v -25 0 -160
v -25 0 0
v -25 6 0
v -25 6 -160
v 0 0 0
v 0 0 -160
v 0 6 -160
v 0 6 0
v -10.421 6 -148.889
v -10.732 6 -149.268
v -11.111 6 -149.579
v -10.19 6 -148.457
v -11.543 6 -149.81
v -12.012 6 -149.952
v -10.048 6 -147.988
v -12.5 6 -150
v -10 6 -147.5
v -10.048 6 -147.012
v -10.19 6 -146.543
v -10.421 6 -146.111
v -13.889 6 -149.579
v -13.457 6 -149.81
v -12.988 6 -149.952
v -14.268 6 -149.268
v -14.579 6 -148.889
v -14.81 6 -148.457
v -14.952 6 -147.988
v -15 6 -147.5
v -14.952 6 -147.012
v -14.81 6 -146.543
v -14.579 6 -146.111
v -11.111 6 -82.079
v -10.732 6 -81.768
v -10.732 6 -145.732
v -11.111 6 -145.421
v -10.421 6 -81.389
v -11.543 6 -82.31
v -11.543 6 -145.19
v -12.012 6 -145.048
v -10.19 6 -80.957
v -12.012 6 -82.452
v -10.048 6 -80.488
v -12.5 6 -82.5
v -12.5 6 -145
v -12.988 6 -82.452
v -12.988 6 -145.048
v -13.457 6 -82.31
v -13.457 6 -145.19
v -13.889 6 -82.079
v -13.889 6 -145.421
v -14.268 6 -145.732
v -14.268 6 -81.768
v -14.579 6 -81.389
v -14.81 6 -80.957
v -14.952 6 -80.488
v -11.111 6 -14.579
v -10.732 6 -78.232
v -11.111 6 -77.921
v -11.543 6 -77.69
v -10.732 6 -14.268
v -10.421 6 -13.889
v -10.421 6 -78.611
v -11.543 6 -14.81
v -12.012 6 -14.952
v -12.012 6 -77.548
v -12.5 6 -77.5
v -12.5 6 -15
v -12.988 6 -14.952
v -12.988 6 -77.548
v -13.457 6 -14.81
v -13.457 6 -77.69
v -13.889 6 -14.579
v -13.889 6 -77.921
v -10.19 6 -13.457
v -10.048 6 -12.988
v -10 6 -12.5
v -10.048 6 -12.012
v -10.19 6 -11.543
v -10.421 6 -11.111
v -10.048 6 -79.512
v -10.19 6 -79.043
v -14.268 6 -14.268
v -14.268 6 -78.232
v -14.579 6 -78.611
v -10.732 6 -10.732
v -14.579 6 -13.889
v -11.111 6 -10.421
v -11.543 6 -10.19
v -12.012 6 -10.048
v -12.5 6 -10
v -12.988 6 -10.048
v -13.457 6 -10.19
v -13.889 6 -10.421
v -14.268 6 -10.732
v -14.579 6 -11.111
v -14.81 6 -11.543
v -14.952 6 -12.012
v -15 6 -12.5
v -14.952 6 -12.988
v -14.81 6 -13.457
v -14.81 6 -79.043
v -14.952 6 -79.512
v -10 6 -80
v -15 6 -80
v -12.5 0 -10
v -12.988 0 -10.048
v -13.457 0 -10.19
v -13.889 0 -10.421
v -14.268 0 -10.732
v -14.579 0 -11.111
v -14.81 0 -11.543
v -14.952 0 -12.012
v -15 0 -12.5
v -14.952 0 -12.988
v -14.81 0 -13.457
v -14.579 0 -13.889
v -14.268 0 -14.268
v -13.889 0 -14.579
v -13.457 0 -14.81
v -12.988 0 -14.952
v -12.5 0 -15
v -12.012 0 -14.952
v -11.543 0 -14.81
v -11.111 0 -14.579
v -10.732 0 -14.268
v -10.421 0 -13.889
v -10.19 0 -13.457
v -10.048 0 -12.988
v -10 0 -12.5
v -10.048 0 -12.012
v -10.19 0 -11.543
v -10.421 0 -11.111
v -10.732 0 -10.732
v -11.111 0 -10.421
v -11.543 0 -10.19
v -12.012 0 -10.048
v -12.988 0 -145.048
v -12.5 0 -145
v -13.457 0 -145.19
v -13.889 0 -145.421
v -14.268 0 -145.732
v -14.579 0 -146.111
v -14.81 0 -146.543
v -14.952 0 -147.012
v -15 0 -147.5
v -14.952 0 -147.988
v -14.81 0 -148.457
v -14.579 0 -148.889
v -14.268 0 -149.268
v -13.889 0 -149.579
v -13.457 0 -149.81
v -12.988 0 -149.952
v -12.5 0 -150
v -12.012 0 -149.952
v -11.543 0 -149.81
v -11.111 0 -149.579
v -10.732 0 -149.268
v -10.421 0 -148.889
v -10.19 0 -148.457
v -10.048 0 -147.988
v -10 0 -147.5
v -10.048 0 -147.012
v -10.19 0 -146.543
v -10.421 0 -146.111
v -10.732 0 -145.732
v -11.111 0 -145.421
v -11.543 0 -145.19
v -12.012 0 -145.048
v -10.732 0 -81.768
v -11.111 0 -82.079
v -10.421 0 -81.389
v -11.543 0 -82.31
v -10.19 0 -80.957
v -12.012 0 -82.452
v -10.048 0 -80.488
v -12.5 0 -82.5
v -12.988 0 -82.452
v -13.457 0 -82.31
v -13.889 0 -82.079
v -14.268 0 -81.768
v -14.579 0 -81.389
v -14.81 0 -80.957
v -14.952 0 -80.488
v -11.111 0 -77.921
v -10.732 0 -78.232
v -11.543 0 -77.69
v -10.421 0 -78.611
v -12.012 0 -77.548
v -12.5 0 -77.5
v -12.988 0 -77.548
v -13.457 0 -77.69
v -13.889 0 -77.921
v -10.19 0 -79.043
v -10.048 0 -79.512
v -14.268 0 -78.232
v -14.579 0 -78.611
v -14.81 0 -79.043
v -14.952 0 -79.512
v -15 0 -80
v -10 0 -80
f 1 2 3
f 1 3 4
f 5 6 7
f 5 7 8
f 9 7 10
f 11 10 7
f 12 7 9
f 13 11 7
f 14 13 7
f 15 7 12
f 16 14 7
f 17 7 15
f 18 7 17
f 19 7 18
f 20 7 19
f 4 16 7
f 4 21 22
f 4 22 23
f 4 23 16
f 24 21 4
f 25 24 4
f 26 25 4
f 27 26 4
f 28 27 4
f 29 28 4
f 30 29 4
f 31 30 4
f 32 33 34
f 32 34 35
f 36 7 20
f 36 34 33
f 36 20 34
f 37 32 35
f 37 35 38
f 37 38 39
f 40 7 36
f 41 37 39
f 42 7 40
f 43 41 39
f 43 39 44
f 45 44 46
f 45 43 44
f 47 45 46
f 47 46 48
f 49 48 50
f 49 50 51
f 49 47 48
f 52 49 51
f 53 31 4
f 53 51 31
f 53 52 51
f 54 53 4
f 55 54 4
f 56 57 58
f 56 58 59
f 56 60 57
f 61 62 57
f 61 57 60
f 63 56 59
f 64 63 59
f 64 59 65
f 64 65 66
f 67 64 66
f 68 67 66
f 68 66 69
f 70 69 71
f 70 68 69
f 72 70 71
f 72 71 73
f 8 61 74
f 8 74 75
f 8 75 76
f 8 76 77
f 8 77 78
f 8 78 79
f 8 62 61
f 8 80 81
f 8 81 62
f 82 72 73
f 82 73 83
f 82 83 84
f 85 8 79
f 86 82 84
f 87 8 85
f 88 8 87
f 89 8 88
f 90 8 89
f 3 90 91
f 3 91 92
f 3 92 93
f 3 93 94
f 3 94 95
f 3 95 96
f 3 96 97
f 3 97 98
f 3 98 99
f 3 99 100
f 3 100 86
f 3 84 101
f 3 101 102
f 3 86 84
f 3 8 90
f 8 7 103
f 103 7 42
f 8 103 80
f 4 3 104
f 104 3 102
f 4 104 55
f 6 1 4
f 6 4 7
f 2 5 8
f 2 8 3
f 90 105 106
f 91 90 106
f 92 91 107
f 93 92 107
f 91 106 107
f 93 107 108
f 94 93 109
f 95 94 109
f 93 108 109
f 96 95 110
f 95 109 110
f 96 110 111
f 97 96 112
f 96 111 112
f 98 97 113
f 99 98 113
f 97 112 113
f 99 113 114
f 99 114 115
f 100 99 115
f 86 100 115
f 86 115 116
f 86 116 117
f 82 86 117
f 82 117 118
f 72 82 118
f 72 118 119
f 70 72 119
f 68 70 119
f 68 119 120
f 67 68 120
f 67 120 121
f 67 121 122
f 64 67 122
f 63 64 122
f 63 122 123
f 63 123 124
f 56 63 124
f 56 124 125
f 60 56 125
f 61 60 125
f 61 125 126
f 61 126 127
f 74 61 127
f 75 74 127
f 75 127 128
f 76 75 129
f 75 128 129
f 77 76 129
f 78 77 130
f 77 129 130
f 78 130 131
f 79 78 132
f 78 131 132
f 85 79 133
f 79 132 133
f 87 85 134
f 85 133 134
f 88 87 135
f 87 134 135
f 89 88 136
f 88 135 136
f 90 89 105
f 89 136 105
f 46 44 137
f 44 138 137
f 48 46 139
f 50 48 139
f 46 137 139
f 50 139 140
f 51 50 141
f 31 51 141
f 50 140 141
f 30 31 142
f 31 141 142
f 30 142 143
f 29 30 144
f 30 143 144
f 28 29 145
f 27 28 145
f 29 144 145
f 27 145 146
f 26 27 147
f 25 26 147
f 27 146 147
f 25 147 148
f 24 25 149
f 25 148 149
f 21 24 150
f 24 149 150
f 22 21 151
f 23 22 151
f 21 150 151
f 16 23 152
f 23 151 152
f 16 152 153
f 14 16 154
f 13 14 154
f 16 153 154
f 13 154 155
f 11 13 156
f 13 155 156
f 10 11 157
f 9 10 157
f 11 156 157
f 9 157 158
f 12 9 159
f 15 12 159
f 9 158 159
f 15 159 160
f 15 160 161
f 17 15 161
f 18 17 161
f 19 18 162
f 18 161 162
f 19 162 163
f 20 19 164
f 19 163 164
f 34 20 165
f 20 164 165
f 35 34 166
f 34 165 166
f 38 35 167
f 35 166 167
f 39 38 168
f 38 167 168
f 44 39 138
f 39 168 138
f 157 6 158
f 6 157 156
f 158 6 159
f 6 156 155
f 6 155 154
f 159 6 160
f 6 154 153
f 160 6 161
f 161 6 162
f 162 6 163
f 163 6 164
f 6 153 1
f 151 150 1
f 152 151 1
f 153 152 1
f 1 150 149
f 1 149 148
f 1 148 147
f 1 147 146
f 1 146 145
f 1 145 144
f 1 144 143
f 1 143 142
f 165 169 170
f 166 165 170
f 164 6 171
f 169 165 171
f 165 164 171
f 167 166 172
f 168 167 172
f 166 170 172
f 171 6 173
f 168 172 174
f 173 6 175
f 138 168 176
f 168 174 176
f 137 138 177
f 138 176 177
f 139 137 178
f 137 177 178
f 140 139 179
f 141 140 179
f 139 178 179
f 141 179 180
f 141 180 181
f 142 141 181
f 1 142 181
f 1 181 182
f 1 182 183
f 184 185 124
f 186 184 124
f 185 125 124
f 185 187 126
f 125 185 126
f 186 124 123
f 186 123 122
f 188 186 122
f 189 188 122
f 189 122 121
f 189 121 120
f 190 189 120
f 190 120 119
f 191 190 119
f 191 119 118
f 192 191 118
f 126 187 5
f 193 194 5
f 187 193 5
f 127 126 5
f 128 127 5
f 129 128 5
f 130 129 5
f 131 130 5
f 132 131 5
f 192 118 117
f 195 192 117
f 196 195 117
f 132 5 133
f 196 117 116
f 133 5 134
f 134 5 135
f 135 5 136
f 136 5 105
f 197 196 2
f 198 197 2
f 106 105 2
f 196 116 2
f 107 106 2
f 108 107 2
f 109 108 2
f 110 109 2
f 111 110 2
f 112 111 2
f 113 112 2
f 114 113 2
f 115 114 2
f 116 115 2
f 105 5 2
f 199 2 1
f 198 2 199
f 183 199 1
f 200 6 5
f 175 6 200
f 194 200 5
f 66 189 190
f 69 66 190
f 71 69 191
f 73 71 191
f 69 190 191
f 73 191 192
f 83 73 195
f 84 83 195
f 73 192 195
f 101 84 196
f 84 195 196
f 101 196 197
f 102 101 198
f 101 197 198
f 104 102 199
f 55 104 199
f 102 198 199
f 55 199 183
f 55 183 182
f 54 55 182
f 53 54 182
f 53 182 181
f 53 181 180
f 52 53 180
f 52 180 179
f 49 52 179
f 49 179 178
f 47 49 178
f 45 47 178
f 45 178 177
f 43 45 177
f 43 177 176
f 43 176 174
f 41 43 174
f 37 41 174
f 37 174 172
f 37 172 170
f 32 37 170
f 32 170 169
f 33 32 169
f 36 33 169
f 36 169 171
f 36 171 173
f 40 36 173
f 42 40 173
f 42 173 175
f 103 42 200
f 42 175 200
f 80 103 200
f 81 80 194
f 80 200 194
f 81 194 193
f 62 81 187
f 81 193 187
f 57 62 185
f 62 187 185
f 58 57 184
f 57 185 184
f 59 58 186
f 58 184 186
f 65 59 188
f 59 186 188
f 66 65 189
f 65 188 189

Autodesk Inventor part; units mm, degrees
ref_plane "YZ Plane" through (0, 0, 0) normal (1, 0, 0) x (0, 1, 0)
ref_plane "XZ Plane" through (0, 0, 0) normal (0, 1, 0) x (-1, 0, 0)
ref_plane "XY Plane" through (0, 0, 0) normal (0, 0, 1) x (1, 0, 0)
sketch "Sketch1" plane through (0, 0, 0) normal (0, 1, 0) x (-1, 0, 0)
  line L0 (0, 0) -> (25, 0)
  line L1 (25, 0) -> (25, -160)
  line L2 (25, -160) -> (0, -160)
  line L3 (0, -160) -> (0, 0)
  dimension "d0" = 25
  dimension "d1" = 160
extrude "Extrusion1" add sketch "Sketch1" along normal blind 6
sketch "Sketch2" plane through (0, 6, 0) normal (0, 1, 0) x (1, 0, 0)
  line L0 (-25, 160) -> (-25, 0) projected
  line L1 (-25, 0) -> (0, 0) projected
  line L2 (0, 160) -> (-25, 160) projected
  point P0 (-12.5, 12.5)
  point P1 (-12.5, 147.5)
  dimension "d4" = 25
  dimension "d5" = 160
  dimension "d6" = 12.5
  dimension "d7" = 12.5
  dimension "d8" = 12.5
  dimension "d9" = 12.5
hole "Hole1" at (-12.5, 6, -12.5) at (-12.5, 6, -147.5) direction (0, -1, 0) diameter 5 end through all
sketch "Esboço3" plane through (0, 6, 0) normal (0, 1, 0) x (1, 0, 0)
  line L0 (0, 160) -> (-25, 160) projected
  line L1 (0, 0) -> (0, 160) projected
  line L2 (-25, 160) -> (-25, 0) projected
  line L3 (-25, 0) -> (0, 0) projected
  point P0 (-12.5, 80)
  point P1 (-12.5, 0)
  dimension "d17" = 160
  dimension "d18" = 25
  dimension "d19" = 12.5
  dimension "d20" = 80
hole "Furo2" at (-12.5, 6, -80) direction (0, -1, 0) diameter 5 depth 6
thread "Rosca1" size "M5x0.8" class "6H" standard "ISO Metric profile" length 43.6
thread "Rosca2" size "M5x0.8" class "6H" standard "ISO Metric profile" length 15
equation "\"d6\" = 0.5 * d4"
equation "\"d7\" = d6"
equation "\"d9\" = d8"
equation "\"d15\" = Thickness"
equation "\"d19\" = 0.5 * d18"
equation "\"d20\" = 0.5 * d17"
equation "\"d26\" = Thickness"
equation "\"BendRadius\" = Thickness"
equation "\"BendReliefWidth\" = Thickness"
equation "\"BendReliefDepth\" = 0.5 * Thickness"
equation "\"CornerReliefSize\" = 4 * Thickness"
equation "\"MinimumRemnant\" = 2 * Thickness"
equation "\"TransitionRadius\" = BendRadius"
equation "\"JacobiRadiusSize\" = BendRadius"
equation "\"GapSize\" = Thickness"
equation "\"Thickness\" = 0.5"
properties part number "Suporte mesa" material "Aluminum 6061"
